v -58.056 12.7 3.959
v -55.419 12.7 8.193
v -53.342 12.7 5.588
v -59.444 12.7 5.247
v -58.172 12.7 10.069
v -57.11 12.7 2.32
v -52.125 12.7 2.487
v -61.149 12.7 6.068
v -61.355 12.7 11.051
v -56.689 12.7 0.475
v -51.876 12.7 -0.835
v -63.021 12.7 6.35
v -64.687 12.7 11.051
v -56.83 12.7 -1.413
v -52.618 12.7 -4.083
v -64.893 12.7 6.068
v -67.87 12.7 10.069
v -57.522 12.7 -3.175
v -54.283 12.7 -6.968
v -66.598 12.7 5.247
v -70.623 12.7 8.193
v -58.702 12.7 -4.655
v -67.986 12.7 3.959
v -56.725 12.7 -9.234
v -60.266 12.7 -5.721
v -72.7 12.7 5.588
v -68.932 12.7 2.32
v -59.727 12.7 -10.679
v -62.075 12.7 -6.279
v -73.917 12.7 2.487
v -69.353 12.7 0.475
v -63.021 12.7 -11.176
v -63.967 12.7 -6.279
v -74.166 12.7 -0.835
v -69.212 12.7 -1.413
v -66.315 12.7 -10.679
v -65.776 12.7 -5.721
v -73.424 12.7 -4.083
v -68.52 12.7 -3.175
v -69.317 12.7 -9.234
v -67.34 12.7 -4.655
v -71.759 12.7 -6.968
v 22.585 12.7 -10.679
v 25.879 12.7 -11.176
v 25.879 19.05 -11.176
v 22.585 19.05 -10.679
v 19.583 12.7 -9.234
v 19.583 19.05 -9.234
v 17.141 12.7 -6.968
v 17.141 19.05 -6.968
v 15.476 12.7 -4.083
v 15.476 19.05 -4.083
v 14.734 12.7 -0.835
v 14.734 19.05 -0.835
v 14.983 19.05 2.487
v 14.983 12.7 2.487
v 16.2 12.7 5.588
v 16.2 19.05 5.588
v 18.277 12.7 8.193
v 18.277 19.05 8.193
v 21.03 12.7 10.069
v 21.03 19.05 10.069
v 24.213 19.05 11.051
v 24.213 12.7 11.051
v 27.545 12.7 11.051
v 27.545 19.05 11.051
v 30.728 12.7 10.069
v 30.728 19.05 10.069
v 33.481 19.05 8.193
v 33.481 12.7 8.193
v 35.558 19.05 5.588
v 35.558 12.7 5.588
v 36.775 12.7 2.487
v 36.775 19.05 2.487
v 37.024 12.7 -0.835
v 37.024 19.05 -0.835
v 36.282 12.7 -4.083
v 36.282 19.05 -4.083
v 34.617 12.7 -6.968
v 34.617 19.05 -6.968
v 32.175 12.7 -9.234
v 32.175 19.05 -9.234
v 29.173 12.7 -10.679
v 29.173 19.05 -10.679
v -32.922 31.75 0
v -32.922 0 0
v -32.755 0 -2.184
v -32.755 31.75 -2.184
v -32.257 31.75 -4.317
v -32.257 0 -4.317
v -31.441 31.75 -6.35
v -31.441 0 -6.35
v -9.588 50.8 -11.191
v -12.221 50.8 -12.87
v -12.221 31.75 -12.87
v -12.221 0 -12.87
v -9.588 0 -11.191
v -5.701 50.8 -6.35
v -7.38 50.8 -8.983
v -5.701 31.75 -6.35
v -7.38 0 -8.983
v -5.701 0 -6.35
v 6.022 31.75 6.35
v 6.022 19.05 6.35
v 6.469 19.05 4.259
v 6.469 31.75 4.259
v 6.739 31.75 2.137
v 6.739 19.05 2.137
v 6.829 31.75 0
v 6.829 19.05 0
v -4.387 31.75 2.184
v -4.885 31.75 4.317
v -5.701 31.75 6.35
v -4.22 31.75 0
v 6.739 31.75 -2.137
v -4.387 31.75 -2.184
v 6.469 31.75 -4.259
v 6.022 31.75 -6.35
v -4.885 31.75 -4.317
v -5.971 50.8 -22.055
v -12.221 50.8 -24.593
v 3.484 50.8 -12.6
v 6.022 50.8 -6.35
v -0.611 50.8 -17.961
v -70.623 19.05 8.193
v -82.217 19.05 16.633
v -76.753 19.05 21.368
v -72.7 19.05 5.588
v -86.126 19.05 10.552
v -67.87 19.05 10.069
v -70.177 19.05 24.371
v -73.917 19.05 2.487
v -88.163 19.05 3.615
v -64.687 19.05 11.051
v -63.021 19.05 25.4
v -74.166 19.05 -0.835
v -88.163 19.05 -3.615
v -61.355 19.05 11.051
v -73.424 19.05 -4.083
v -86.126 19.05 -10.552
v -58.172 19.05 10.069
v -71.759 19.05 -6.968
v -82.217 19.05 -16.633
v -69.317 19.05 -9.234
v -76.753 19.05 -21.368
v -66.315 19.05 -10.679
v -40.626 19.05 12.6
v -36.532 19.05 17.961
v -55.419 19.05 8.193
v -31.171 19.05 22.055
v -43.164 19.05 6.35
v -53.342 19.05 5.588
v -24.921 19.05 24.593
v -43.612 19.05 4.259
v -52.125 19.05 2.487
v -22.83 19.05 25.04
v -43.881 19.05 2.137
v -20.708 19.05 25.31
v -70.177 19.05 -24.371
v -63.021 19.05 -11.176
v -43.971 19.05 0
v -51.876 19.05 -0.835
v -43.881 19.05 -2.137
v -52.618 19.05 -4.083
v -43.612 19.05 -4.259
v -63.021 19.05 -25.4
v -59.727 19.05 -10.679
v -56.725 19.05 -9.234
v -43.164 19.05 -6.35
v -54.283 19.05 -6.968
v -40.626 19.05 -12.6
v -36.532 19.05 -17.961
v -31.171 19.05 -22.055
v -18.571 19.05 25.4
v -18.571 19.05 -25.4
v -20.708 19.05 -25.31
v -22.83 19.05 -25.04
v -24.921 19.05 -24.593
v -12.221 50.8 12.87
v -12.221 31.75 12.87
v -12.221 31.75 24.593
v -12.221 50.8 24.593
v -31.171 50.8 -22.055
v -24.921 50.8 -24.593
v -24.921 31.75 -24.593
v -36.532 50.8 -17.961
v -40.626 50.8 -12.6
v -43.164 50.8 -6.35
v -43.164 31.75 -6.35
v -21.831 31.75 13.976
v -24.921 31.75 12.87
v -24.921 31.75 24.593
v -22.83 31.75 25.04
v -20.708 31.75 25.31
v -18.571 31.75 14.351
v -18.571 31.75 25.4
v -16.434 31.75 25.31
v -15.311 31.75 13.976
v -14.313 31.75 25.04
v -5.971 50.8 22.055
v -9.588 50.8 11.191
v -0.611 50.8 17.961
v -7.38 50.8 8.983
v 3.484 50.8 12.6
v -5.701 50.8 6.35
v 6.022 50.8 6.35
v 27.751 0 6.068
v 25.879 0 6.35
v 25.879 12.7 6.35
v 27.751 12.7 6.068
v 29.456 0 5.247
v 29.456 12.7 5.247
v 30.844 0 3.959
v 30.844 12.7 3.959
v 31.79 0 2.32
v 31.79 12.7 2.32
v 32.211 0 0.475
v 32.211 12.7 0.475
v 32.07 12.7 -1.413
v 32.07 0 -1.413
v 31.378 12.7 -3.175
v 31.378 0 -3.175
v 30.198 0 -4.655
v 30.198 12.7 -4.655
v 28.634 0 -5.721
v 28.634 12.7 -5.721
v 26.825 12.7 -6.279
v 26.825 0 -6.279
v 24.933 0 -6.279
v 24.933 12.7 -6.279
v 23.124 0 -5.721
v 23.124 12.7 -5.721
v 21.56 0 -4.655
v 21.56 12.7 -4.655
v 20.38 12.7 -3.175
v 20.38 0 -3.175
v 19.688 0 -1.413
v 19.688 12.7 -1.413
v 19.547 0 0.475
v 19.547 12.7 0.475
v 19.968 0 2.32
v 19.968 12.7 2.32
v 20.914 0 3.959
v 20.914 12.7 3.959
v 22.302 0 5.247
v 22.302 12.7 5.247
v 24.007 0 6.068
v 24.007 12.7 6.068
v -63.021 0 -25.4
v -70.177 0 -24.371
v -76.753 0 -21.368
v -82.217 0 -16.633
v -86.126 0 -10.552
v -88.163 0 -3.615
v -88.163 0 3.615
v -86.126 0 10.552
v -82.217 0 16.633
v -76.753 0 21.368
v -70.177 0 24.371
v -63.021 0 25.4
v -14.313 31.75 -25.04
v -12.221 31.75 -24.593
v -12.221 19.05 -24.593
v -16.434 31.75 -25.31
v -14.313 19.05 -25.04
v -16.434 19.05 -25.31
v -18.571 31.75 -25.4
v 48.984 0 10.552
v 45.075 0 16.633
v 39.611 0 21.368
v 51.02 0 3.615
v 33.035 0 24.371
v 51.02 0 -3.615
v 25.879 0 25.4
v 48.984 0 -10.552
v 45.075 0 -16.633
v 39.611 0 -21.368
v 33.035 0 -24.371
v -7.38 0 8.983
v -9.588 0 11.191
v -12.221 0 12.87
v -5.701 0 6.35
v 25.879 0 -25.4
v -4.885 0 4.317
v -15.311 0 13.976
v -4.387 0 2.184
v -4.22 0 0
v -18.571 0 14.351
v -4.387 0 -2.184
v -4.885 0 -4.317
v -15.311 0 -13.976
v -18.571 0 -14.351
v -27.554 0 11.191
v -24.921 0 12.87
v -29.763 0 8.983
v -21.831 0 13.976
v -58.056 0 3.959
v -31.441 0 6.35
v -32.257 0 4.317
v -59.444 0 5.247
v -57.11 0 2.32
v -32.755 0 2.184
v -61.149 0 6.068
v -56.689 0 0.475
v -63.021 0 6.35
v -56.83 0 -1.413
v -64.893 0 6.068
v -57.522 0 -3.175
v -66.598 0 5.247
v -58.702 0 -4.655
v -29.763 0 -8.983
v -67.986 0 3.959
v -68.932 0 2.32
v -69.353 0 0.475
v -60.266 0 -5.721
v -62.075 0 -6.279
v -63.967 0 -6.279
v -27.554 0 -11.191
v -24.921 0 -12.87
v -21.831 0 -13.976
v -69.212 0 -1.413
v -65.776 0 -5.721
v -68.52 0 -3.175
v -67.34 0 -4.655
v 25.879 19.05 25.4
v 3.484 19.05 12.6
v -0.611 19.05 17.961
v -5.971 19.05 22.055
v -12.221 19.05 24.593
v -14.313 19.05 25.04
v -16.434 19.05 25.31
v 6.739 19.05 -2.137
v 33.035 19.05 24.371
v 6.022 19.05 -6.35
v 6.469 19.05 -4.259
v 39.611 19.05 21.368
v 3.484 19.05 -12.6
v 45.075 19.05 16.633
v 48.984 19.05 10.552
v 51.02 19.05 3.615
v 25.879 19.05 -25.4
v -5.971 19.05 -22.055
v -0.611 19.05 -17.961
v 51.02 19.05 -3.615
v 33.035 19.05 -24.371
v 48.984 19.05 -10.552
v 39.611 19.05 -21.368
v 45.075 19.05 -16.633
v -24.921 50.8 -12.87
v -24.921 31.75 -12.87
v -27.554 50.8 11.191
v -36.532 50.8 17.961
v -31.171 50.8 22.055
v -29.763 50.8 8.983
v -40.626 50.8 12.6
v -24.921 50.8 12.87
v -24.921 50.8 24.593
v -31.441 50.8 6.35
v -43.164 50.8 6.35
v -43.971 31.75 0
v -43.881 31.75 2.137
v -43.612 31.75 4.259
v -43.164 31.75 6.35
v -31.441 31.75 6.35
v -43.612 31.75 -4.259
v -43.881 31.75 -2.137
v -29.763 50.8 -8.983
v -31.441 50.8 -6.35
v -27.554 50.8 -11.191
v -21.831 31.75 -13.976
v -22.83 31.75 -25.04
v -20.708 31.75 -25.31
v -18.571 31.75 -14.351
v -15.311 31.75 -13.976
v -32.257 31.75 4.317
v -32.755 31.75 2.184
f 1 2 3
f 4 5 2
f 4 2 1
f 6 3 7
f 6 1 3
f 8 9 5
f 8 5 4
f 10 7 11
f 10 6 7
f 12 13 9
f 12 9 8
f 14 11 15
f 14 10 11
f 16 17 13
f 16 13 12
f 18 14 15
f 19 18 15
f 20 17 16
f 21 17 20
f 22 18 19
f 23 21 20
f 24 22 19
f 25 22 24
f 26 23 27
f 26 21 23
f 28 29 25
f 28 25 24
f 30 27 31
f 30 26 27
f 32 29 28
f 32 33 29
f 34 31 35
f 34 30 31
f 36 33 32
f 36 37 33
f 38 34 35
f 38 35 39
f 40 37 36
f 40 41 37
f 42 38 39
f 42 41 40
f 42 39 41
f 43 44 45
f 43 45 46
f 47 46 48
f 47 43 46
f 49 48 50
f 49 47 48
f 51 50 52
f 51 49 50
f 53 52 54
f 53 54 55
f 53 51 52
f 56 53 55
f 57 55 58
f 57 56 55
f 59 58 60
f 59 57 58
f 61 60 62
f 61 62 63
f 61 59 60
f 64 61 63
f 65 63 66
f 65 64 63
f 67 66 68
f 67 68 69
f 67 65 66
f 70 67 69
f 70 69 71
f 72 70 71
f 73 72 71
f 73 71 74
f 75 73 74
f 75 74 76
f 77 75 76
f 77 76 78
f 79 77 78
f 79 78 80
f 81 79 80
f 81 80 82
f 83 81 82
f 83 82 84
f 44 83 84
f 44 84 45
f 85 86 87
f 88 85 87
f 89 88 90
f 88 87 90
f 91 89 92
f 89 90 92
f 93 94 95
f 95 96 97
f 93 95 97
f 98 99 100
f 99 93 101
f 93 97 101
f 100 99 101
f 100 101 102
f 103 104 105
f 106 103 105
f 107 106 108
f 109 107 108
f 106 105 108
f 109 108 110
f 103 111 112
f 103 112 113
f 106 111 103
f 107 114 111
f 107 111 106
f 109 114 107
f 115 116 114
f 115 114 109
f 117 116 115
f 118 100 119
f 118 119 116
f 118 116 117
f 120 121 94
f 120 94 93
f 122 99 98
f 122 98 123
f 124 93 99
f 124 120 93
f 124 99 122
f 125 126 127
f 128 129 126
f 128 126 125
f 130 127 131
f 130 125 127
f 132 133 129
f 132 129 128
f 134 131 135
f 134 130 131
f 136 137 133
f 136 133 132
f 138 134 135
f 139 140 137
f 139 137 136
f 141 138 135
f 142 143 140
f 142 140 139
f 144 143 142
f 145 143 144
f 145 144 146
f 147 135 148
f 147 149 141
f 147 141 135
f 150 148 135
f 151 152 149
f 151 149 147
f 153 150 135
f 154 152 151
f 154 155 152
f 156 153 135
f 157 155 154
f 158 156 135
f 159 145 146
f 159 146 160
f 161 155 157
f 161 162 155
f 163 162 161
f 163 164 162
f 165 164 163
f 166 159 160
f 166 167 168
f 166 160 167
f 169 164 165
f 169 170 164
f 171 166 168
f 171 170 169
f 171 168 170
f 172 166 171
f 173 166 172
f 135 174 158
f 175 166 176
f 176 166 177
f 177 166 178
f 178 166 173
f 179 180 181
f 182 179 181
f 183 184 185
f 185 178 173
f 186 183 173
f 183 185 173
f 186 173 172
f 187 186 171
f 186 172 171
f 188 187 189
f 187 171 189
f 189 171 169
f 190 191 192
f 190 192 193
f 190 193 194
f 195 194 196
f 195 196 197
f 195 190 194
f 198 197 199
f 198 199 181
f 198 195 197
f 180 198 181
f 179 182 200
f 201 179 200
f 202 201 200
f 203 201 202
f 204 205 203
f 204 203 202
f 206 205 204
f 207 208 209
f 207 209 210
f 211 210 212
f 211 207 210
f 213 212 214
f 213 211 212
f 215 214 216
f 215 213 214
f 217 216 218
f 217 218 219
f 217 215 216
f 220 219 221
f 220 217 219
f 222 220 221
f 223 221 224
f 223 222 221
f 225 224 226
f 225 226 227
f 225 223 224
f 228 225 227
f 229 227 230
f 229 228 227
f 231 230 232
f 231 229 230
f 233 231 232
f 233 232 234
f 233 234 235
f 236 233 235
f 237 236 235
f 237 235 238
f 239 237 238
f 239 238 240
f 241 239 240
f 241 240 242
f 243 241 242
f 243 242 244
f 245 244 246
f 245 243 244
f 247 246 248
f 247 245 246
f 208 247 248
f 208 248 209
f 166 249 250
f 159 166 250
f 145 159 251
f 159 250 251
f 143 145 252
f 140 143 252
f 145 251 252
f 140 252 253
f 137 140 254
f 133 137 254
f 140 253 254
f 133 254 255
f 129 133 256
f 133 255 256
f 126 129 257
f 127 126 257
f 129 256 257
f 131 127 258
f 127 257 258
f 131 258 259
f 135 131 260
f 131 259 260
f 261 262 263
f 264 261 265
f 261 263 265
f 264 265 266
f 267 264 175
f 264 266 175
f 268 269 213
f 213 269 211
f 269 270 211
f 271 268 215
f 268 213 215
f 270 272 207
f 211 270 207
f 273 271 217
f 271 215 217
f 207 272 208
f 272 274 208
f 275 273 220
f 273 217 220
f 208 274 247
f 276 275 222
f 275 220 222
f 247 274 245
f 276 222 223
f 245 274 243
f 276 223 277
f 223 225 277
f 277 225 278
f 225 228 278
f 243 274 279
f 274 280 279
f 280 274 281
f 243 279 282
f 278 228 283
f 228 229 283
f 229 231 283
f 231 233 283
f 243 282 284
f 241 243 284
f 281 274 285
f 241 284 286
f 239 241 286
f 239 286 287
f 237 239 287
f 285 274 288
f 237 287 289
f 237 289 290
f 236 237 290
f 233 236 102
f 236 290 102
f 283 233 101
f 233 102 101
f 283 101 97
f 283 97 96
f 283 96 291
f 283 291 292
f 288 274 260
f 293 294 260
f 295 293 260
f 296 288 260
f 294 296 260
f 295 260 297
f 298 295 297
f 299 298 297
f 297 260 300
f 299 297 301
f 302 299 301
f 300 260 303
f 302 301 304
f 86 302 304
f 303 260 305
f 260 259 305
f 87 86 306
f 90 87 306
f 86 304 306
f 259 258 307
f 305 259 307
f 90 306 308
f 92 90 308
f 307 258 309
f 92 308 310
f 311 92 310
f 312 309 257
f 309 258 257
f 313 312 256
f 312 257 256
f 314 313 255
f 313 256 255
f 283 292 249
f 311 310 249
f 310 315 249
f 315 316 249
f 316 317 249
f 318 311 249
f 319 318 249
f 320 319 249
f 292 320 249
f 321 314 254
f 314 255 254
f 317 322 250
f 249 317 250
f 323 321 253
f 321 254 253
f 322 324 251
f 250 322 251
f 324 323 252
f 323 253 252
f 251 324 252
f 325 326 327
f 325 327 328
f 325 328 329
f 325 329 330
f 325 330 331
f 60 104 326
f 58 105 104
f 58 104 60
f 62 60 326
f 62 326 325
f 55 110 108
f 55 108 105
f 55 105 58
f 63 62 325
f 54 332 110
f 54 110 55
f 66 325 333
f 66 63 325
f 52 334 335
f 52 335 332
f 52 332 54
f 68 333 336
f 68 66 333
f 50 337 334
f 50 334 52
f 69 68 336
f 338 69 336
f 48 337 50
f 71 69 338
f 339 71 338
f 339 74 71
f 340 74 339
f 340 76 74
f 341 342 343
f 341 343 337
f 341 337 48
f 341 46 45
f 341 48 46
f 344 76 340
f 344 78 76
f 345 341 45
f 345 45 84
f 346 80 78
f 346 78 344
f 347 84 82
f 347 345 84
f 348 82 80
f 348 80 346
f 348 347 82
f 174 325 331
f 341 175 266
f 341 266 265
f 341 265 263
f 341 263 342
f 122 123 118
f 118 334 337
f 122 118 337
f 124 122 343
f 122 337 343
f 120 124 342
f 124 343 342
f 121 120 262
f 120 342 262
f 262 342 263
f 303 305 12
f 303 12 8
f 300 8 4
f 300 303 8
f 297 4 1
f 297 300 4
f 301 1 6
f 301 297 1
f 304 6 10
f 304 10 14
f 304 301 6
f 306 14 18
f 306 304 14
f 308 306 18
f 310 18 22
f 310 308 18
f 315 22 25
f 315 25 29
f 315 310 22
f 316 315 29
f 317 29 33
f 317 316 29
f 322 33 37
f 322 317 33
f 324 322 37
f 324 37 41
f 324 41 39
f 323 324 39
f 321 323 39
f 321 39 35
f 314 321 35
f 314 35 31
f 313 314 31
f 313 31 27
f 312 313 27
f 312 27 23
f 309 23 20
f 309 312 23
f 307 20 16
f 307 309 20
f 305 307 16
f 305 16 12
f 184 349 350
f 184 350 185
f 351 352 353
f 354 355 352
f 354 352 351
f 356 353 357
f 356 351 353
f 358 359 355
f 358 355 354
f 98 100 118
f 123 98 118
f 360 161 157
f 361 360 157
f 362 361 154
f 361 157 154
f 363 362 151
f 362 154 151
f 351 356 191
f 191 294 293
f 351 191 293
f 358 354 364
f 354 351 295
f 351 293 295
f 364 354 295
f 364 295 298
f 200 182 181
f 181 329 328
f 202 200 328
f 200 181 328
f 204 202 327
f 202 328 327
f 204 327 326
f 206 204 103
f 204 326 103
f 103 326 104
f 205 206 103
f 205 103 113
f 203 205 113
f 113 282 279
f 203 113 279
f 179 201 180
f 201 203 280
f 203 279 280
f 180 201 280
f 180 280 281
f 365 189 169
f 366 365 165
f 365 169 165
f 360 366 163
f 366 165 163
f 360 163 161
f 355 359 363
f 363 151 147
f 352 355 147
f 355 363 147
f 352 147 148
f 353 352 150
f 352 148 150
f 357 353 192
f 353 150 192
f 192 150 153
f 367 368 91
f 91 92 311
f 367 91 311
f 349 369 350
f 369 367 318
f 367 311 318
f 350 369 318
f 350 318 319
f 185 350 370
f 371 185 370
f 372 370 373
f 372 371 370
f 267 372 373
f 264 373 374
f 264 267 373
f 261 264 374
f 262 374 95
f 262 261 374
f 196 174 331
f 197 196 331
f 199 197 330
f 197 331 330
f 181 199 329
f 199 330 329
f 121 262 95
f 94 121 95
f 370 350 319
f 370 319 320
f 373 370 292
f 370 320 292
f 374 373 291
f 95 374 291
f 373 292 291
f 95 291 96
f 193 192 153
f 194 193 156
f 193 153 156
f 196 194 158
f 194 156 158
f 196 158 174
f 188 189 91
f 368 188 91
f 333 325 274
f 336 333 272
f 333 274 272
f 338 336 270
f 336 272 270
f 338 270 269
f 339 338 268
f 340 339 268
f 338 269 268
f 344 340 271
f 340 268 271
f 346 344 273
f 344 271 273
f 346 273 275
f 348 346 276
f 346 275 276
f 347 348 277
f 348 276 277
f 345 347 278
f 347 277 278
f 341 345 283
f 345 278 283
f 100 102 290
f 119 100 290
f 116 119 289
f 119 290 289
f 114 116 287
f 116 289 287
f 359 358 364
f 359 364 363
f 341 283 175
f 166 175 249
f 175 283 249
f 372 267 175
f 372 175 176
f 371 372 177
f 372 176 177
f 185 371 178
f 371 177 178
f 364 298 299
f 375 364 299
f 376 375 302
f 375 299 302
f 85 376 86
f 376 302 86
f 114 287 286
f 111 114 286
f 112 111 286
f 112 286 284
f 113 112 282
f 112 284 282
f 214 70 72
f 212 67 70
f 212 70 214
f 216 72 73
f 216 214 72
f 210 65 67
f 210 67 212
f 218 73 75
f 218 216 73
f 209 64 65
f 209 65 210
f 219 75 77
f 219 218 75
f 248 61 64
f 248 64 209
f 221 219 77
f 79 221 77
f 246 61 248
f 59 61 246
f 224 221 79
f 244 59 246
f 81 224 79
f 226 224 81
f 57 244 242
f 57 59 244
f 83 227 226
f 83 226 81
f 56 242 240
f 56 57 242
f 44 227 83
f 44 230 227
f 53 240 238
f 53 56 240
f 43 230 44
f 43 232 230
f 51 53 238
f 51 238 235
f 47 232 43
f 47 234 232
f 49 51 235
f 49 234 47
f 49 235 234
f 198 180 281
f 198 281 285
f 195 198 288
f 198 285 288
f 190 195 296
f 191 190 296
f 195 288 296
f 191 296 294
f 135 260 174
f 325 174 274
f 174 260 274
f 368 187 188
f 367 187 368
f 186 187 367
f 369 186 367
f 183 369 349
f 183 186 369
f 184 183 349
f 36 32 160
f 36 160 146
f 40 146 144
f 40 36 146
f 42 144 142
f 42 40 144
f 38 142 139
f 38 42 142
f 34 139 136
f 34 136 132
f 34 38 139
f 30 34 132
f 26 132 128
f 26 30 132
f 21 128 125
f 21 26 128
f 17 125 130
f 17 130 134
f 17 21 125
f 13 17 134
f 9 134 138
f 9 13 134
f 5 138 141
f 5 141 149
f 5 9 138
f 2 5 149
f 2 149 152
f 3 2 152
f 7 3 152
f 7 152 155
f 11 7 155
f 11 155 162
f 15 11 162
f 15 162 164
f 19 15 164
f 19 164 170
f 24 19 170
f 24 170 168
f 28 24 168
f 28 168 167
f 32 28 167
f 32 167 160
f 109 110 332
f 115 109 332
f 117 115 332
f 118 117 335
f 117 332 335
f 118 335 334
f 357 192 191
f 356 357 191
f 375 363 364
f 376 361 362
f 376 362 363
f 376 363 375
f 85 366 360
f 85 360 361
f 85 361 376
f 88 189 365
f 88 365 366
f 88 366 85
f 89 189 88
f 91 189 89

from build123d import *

# Parameters (mm, degrees)
SKETCH1_R             = 11.176
BOSS_EXTRUDE1_DEPTH   = 19.05
BOSS_EXTRUDE1_2_DEPTH = 19.05
BOSS_EXTRUDE2_DEPTH   = 50.8
BOSS_EXTRUDE3_DEPTH   = 31.75
SKETCH1_5_R           = 11.176
SKETCH1_5_R_2         = 6.35
BOSS_EXTRUDE4_DEPTH   = 12.7


with BuildPart() as part:
    # Sketch1 → Boss-Extrude1 (new body)
    with BuildSketch(Plane(origin=(0, 0, 0), x_dir=(1, 0, 0), z_dir=(0, 1, 0))):
        with BuildLine():
            ThreePointArc((-63.02104825, 25.4), (-88.42104825, 0), (-63.02104825, -25.4))
            Line((-63.02104825, -25.4), (-18.57104825, -25.4))
            ThreePointArc((-18.57104825, -25.4), (-43.97104825, -1.3e-08), (-18.571048276, 25.4))
            Line((-18.571048276, 25.4), (-63.02104825, 25.4))
        make_face()
        with Locations(Location((-63.02104825, 0, 0), (0, 0, 90))):
            Circle(SKETCH1_R, mode=Mode.SUBTRACT)
    extrude(amount=BOSS_EXTRUDE1_DEPTH)



with BuildPart() as body_2:
    # Sketch1 → Boss-Extrude1 2 (new body)
    with BuildSketch(Plane(origin=(0, 0, 0), x_dir=(1, 0, 0), z_dir=(0, 1, 0))):
        with BuildLine():
            ThreePointArc((-18.571048276, 25.4), (6.82895175, 1.3e-08), (-18.57104825, -25.4))
            Line((-18.57104825, -25.4), (25.87895175, -25.4))
            ThreePointArc((25.87895175, -25.4), (51.27895175, 0), (25.87895175, 25.4))
            Line((25.87895175, 25.4), (-18.571048276, 25.4))
        make_face()
        with Locations(Location((25.87895175, 0, 0), (0, 0, 90))):
            Circle(SKETCH1_R, mode=Mode.SUBTRACT)
    extrude(amount=BOSS_EXTRUDE1_2_DEPTH)


with BuildPart() as part_1:
    add(part.part)

    add(body_2.part)  # Boss-Extrude2 merges body 2
    # Sketch1<3> → Boss-Extrude2 (add)
    with BuildSketch(Plane(origin=(0, 0, 0), x_dir=(1, 0, 0), z_dir=(0, 1, 0))):
        with BuildLine():
            Line((-24.92104825, 12.869681465), (-24.92104825, 24.593444248))
            ThreePointArc((-24.92104825, 24.593444248), (-36.531560492, 17.960512242), (-43.164492498, 6.35))
            Line((-43.164492498, 6.35), (-31.440729714, 6.35))
            ThreePointArc((-31.440729714, 6.35), (-28.718737667, 10.147689417), (-24.92104825, 12.869681465))
        make_face()
        with BuildLine():
            ThreePointArc((6.022395999, 6.35), (-0.610536008, 17.960512242), (-12.22104825, 24.593444248))
            Line((-12.22104825, 24.593444248), (-12.22104825, 12.869681465))
            ThreePointArc((-12.22104825, 12.869681465), (-8.423358833, 10.147689417), (-5.701366785, 6.35))
            Line((-5.701366785, 6.35), (6.022395999, 6.35))
        make_face()
        with BuildLine():
            ThreePointArc((-43.164492498, -6.35), (-36.531560492, -17.960512242), (-24.92104825, -24.593444248))
            Line((-24.92104825, -24.593444248), (-24.92104825, -12.869681465))
            ThreePointArc((-24.92104825, -12.869681465), (-28.718737667, -10.147689417), (-31.440729714, -6.35))
            Line((-31.440729714, -6.35), (-43.164492498, -6.35))
        make_face()
        with BuildLine():
            Line((-12.22104825, -12.869681465), (-12.22104825, -24.593444248))
            ThreePointArc((-12.22104825, -24.593444248), (-0.610536008, -17.960512242), (6.022395999, -6.35))
            Line((6.022395999, -6.35), (-5.701366785, -6.35))
            ThreePointArc((-5.701366785, -6.35), (-8.423358833, -10.147689417), (-12.22104825, -12.869681465))
        make_face()
    extrude(amount=BOSS_EXTRUDE2_DEPTH)

    # Sketch1<4> → Boss-Extrude3 (add)
    with BuildSketch(Plane(origin=(0, 0, 0), x_dir=(1, 0, 0), z_dir=(0, 1, 0))):
        with BuildLine():
            ThreePointArc((-18.571048276, 25.4), (-21.771557292, 25.197554284), (-24.92104825, 24.593444248))
            Line((-24.92104825, 24.593444248), (-24.92104825, 12.869681465))
            ThreePointArc((-24.92104825, 12.869681465), (-18.57104825, 14.351), (-12.22104825, 12.869681465))
            Line((-12.22104825, 12.869681465), (-12.22104825, 24.593444248))
            ThreePointArc((-12.22104825, 24.593444248), (-15.370539234, 25.197554287), (-18.571048276, 25.4))
        make_face()
        with BuildLine():
            Line((-24.92104825, -12.869681465), (-24.92104825, -24.593444248))
            ThreePointArc((-24.92104825, -24.593444248), (-21.771557279, -25.197554285), (-18.57104825, -25.4))
            ThreePointArc((-18.57104825, -25.4), (-15.370539221, -25.197554285), (-12.22104825, -24.593444248))
            Line((-12.22104825, -24.593444248), (-12.22104825, -12.869681465))
            ThreePointArc((-12.22104825, -12.869681465), (-18.57104825, -14.351), (-24.92104825, -12.869681465))
        make_face()
        with BuildLine():
            ThreePointArc((-43.164492498, 6.35), (-43.768602535, 3.200509029), (-43.97104825, 0))
            Line((-43.97104825, 0), (-32.92204825, 0))
            ThreePointArc((-32.92204825, 0), (-32.546812982, 3.260245566), (-31.440729714, 6.35))
            Line((-31.440729714, 6.35), (-43.164492498, 6.35))
        make_face()
        with BuildLine():
            ThreePointArc((-5.701366785, 6.35), (-4.595283518, 3.260245566), (-4.22004825, 0))
            Line((-4.22004825, 0), (6.82895175, 0))
            ThreePointArc((6.82895175, 0), (6.626506035, 3.200509029), (6.022395999, 6.35))
            Line((6.022395999, 6.35), (-5.701366785, 6.35))
        make_face()
        with BuildLine():
            Line((-32.92204825, 0), (-43.97104825, 0))
            ThreePointArc((-43.97104825, 0), (-43.768602535, -3.200509029), (-43.164492498, -6.35))
            Line((-43.164492498, -6.35), (-31.440729714, -6.35))
            ThreePointArc((-31.440729714, -6.35), (-32.546812982, -3.260245566), (-32.92204825, 0))
        make_face()
        with BuildLine():
            Line((6.82895175, 0), (-4.22004825, 0))
            ThreePointArc((-4.22004825, 0), (-4.595283518, -3.260245566), (-5.701366785, -6.35))
            Line((-5.701366785, -6.35), (6.022395999, -6.35))
            ThreePointArc((6.022395999, -6.35), (6.626506035, -3.200509029), (6.82895175, 0))
        make_face()
    extrude(amount=BOSS_EXTRUDE3_DEPTH)

    # Sketch1<5> → Boss-Extrude4 (add)
    # profile 1 of 2: a face of its own
    with BuildSketch(Plane(origin=(0, 0, 0), x_dir=(1, 0, 0), z_dir=(0, 1, 0))):
        with Locations(Location((-63.02104825, 0, 0), (0, 0, 90))):
            Circle(SKETCH1_5_R)
        with Locations(Location((-63.02104825, 0, 0), (0, 0, 270))):
            Circle(SKETCH1_5_R_2, mode=Mode.SUBTRACT)
    # profile 2 of 2: a face of its own
    with BuildSketch(Plane(origin=(0, 0, 0), x_dir=(1, 0, 0), z_dir=(0, 1, 0))):
        with Locations(Location((25.87895175, 0, 0), (0, 0, 90))):
            Circle(SKETCH1_5_R)
        with Locations(Location((25.87895175, 0, 0), (0, 0, 270))):
            Circle(SKETCH1_5_R_2, mode=Mode.SUBTRACT)
    extrude(amount=BOSS_EXTRUDE4_DEPTH)


solid = part_1.part
